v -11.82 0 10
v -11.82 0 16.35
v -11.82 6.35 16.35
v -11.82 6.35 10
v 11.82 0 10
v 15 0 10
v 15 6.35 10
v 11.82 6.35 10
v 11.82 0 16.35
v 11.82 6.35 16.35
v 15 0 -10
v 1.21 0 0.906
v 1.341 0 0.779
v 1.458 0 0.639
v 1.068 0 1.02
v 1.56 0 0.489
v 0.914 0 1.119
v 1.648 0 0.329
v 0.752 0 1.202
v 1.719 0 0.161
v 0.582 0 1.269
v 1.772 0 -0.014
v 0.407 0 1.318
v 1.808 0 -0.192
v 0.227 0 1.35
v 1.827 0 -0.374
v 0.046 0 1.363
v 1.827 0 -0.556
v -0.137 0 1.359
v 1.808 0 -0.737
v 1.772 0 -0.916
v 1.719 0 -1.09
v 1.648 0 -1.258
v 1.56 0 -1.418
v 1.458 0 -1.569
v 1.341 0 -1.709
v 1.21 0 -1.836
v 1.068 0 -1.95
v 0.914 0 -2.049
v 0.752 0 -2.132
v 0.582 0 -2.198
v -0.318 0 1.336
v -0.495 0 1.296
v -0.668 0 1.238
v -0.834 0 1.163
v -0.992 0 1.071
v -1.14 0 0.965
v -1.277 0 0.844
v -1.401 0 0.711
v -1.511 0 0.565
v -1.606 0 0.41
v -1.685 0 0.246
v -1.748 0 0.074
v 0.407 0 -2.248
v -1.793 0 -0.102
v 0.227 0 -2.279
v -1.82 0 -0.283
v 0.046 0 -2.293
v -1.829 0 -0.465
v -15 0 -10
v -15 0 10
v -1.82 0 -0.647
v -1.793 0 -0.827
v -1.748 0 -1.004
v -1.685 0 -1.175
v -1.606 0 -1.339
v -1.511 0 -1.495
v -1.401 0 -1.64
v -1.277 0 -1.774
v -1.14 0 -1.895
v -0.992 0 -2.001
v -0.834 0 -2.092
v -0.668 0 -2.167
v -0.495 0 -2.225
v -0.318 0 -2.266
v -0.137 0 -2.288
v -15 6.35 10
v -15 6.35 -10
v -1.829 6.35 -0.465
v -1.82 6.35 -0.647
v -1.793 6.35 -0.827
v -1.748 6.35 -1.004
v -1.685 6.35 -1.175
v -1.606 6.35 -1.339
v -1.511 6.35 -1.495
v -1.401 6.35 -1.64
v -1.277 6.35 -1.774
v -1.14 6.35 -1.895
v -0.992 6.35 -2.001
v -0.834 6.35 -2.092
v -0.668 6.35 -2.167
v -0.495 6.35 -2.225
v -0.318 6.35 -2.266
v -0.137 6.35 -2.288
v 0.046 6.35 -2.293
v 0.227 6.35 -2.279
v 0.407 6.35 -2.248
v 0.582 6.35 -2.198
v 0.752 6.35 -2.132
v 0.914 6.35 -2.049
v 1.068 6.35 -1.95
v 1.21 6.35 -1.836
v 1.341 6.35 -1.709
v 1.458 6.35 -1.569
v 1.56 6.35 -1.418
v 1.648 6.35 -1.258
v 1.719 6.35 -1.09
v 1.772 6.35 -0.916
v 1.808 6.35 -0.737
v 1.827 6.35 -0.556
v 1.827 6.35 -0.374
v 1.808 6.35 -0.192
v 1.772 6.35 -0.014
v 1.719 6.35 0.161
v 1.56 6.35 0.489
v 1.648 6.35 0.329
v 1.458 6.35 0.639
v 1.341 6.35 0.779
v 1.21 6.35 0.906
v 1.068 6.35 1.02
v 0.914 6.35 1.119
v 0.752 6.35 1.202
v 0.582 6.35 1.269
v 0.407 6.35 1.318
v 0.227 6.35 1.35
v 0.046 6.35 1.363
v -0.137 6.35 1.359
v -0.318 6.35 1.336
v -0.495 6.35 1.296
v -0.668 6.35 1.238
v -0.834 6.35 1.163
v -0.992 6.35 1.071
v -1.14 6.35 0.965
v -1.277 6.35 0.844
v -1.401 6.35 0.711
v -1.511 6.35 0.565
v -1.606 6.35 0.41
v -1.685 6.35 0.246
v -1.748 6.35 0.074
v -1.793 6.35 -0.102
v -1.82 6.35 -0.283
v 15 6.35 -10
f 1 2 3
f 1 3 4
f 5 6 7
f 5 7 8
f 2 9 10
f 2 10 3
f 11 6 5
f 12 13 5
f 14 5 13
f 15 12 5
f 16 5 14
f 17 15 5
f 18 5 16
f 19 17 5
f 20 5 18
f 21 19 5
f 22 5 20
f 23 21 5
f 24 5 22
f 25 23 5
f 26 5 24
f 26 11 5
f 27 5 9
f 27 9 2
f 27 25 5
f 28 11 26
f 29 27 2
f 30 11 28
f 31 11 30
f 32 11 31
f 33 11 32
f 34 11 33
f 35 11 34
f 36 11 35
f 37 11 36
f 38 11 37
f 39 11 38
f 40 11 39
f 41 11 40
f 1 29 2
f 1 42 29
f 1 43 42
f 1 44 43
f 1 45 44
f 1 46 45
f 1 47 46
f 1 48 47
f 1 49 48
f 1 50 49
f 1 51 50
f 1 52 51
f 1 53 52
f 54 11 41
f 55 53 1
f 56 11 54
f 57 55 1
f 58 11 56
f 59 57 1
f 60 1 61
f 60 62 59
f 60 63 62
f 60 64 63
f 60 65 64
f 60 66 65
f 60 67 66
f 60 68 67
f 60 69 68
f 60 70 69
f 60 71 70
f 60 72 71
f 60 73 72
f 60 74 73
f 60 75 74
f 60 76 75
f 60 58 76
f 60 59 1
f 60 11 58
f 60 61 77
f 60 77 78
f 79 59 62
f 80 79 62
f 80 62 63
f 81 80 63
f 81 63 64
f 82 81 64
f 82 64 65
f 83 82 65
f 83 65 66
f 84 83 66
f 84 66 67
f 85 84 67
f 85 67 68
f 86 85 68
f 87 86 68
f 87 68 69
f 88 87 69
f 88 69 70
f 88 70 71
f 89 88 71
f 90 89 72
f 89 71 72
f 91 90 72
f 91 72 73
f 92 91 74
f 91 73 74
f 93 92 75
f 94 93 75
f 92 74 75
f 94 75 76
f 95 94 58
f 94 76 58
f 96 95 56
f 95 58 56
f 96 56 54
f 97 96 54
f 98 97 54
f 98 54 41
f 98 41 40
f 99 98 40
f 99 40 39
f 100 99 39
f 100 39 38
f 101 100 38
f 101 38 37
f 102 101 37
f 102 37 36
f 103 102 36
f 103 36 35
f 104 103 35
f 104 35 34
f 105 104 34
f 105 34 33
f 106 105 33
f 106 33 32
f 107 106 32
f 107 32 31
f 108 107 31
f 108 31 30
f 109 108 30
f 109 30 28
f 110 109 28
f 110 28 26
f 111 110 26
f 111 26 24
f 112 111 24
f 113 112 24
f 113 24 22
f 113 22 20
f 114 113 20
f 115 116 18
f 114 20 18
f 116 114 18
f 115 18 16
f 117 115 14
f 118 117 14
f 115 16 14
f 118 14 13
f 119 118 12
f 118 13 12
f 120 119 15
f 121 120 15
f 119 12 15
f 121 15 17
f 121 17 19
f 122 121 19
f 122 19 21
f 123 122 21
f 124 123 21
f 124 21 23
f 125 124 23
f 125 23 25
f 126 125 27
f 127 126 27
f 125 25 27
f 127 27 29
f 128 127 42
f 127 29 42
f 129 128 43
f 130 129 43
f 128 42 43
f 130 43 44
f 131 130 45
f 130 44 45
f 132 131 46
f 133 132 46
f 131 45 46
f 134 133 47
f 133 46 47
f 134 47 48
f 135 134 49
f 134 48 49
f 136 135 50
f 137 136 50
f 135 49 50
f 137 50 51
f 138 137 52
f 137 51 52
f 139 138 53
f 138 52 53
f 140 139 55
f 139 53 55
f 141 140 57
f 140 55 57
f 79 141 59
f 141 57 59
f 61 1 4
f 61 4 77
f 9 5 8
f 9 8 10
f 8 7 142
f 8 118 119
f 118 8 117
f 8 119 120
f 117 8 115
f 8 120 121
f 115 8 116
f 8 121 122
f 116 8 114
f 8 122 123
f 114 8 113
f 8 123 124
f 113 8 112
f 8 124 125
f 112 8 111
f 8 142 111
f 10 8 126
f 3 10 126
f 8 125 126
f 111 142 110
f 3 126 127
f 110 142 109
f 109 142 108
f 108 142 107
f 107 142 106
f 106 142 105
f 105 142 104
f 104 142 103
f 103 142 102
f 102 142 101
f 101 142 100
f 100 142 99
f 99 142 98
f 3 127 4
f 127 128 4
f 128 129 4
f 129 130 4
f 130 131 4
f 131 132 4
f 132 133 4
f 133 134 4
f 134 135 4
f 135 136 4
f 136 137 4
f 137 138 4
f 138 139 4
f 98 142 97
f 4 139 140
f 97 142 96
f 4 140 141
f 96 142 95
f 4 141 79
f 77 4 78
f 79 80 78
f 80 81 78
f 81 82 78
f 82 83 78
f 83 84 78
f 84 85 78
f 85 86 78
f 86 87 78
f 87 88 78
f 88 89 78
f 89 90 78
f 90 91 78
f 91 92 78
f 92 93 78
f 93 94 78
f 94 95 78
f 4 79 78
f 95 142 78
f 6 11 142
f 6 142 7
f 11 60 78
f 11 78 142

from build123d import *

# Parameters (mm, degrees)
BOSS_EXTRUDE1_DEPTH   = 6.35
F_6_CLEARANCE_HOLE1_D = 3.6576


with BuildPart() as part:
    # Sketch1 → Boss-Extrude1 (new body)
    with BuildSketch(Plane(origin=(0, 0, 0), x_dir=(1, 0, 0), z_dir=(0, 1, 0))):
        Polygon((-15, -10), (-15, 10), (15, 10), (15, -10), (11.82, -10), (11.82, -16.35), (-11.82, -16.35), (-11.82, -10), align=None)
    extrude(amount=BOSS_EXTRUDE1_DEPTH)

    # #6 Clearance Hole1 (through all)
    with Locations(Plane(origin=(0, 6.35, 0), x_dir=(1, 0, 0), z_dir=(0, 1, 0))):
        with Locations((0, 0.4648)):
            Hole(F_6_CLEARANCE_HOLE1_D / 2)


solid = part.part
